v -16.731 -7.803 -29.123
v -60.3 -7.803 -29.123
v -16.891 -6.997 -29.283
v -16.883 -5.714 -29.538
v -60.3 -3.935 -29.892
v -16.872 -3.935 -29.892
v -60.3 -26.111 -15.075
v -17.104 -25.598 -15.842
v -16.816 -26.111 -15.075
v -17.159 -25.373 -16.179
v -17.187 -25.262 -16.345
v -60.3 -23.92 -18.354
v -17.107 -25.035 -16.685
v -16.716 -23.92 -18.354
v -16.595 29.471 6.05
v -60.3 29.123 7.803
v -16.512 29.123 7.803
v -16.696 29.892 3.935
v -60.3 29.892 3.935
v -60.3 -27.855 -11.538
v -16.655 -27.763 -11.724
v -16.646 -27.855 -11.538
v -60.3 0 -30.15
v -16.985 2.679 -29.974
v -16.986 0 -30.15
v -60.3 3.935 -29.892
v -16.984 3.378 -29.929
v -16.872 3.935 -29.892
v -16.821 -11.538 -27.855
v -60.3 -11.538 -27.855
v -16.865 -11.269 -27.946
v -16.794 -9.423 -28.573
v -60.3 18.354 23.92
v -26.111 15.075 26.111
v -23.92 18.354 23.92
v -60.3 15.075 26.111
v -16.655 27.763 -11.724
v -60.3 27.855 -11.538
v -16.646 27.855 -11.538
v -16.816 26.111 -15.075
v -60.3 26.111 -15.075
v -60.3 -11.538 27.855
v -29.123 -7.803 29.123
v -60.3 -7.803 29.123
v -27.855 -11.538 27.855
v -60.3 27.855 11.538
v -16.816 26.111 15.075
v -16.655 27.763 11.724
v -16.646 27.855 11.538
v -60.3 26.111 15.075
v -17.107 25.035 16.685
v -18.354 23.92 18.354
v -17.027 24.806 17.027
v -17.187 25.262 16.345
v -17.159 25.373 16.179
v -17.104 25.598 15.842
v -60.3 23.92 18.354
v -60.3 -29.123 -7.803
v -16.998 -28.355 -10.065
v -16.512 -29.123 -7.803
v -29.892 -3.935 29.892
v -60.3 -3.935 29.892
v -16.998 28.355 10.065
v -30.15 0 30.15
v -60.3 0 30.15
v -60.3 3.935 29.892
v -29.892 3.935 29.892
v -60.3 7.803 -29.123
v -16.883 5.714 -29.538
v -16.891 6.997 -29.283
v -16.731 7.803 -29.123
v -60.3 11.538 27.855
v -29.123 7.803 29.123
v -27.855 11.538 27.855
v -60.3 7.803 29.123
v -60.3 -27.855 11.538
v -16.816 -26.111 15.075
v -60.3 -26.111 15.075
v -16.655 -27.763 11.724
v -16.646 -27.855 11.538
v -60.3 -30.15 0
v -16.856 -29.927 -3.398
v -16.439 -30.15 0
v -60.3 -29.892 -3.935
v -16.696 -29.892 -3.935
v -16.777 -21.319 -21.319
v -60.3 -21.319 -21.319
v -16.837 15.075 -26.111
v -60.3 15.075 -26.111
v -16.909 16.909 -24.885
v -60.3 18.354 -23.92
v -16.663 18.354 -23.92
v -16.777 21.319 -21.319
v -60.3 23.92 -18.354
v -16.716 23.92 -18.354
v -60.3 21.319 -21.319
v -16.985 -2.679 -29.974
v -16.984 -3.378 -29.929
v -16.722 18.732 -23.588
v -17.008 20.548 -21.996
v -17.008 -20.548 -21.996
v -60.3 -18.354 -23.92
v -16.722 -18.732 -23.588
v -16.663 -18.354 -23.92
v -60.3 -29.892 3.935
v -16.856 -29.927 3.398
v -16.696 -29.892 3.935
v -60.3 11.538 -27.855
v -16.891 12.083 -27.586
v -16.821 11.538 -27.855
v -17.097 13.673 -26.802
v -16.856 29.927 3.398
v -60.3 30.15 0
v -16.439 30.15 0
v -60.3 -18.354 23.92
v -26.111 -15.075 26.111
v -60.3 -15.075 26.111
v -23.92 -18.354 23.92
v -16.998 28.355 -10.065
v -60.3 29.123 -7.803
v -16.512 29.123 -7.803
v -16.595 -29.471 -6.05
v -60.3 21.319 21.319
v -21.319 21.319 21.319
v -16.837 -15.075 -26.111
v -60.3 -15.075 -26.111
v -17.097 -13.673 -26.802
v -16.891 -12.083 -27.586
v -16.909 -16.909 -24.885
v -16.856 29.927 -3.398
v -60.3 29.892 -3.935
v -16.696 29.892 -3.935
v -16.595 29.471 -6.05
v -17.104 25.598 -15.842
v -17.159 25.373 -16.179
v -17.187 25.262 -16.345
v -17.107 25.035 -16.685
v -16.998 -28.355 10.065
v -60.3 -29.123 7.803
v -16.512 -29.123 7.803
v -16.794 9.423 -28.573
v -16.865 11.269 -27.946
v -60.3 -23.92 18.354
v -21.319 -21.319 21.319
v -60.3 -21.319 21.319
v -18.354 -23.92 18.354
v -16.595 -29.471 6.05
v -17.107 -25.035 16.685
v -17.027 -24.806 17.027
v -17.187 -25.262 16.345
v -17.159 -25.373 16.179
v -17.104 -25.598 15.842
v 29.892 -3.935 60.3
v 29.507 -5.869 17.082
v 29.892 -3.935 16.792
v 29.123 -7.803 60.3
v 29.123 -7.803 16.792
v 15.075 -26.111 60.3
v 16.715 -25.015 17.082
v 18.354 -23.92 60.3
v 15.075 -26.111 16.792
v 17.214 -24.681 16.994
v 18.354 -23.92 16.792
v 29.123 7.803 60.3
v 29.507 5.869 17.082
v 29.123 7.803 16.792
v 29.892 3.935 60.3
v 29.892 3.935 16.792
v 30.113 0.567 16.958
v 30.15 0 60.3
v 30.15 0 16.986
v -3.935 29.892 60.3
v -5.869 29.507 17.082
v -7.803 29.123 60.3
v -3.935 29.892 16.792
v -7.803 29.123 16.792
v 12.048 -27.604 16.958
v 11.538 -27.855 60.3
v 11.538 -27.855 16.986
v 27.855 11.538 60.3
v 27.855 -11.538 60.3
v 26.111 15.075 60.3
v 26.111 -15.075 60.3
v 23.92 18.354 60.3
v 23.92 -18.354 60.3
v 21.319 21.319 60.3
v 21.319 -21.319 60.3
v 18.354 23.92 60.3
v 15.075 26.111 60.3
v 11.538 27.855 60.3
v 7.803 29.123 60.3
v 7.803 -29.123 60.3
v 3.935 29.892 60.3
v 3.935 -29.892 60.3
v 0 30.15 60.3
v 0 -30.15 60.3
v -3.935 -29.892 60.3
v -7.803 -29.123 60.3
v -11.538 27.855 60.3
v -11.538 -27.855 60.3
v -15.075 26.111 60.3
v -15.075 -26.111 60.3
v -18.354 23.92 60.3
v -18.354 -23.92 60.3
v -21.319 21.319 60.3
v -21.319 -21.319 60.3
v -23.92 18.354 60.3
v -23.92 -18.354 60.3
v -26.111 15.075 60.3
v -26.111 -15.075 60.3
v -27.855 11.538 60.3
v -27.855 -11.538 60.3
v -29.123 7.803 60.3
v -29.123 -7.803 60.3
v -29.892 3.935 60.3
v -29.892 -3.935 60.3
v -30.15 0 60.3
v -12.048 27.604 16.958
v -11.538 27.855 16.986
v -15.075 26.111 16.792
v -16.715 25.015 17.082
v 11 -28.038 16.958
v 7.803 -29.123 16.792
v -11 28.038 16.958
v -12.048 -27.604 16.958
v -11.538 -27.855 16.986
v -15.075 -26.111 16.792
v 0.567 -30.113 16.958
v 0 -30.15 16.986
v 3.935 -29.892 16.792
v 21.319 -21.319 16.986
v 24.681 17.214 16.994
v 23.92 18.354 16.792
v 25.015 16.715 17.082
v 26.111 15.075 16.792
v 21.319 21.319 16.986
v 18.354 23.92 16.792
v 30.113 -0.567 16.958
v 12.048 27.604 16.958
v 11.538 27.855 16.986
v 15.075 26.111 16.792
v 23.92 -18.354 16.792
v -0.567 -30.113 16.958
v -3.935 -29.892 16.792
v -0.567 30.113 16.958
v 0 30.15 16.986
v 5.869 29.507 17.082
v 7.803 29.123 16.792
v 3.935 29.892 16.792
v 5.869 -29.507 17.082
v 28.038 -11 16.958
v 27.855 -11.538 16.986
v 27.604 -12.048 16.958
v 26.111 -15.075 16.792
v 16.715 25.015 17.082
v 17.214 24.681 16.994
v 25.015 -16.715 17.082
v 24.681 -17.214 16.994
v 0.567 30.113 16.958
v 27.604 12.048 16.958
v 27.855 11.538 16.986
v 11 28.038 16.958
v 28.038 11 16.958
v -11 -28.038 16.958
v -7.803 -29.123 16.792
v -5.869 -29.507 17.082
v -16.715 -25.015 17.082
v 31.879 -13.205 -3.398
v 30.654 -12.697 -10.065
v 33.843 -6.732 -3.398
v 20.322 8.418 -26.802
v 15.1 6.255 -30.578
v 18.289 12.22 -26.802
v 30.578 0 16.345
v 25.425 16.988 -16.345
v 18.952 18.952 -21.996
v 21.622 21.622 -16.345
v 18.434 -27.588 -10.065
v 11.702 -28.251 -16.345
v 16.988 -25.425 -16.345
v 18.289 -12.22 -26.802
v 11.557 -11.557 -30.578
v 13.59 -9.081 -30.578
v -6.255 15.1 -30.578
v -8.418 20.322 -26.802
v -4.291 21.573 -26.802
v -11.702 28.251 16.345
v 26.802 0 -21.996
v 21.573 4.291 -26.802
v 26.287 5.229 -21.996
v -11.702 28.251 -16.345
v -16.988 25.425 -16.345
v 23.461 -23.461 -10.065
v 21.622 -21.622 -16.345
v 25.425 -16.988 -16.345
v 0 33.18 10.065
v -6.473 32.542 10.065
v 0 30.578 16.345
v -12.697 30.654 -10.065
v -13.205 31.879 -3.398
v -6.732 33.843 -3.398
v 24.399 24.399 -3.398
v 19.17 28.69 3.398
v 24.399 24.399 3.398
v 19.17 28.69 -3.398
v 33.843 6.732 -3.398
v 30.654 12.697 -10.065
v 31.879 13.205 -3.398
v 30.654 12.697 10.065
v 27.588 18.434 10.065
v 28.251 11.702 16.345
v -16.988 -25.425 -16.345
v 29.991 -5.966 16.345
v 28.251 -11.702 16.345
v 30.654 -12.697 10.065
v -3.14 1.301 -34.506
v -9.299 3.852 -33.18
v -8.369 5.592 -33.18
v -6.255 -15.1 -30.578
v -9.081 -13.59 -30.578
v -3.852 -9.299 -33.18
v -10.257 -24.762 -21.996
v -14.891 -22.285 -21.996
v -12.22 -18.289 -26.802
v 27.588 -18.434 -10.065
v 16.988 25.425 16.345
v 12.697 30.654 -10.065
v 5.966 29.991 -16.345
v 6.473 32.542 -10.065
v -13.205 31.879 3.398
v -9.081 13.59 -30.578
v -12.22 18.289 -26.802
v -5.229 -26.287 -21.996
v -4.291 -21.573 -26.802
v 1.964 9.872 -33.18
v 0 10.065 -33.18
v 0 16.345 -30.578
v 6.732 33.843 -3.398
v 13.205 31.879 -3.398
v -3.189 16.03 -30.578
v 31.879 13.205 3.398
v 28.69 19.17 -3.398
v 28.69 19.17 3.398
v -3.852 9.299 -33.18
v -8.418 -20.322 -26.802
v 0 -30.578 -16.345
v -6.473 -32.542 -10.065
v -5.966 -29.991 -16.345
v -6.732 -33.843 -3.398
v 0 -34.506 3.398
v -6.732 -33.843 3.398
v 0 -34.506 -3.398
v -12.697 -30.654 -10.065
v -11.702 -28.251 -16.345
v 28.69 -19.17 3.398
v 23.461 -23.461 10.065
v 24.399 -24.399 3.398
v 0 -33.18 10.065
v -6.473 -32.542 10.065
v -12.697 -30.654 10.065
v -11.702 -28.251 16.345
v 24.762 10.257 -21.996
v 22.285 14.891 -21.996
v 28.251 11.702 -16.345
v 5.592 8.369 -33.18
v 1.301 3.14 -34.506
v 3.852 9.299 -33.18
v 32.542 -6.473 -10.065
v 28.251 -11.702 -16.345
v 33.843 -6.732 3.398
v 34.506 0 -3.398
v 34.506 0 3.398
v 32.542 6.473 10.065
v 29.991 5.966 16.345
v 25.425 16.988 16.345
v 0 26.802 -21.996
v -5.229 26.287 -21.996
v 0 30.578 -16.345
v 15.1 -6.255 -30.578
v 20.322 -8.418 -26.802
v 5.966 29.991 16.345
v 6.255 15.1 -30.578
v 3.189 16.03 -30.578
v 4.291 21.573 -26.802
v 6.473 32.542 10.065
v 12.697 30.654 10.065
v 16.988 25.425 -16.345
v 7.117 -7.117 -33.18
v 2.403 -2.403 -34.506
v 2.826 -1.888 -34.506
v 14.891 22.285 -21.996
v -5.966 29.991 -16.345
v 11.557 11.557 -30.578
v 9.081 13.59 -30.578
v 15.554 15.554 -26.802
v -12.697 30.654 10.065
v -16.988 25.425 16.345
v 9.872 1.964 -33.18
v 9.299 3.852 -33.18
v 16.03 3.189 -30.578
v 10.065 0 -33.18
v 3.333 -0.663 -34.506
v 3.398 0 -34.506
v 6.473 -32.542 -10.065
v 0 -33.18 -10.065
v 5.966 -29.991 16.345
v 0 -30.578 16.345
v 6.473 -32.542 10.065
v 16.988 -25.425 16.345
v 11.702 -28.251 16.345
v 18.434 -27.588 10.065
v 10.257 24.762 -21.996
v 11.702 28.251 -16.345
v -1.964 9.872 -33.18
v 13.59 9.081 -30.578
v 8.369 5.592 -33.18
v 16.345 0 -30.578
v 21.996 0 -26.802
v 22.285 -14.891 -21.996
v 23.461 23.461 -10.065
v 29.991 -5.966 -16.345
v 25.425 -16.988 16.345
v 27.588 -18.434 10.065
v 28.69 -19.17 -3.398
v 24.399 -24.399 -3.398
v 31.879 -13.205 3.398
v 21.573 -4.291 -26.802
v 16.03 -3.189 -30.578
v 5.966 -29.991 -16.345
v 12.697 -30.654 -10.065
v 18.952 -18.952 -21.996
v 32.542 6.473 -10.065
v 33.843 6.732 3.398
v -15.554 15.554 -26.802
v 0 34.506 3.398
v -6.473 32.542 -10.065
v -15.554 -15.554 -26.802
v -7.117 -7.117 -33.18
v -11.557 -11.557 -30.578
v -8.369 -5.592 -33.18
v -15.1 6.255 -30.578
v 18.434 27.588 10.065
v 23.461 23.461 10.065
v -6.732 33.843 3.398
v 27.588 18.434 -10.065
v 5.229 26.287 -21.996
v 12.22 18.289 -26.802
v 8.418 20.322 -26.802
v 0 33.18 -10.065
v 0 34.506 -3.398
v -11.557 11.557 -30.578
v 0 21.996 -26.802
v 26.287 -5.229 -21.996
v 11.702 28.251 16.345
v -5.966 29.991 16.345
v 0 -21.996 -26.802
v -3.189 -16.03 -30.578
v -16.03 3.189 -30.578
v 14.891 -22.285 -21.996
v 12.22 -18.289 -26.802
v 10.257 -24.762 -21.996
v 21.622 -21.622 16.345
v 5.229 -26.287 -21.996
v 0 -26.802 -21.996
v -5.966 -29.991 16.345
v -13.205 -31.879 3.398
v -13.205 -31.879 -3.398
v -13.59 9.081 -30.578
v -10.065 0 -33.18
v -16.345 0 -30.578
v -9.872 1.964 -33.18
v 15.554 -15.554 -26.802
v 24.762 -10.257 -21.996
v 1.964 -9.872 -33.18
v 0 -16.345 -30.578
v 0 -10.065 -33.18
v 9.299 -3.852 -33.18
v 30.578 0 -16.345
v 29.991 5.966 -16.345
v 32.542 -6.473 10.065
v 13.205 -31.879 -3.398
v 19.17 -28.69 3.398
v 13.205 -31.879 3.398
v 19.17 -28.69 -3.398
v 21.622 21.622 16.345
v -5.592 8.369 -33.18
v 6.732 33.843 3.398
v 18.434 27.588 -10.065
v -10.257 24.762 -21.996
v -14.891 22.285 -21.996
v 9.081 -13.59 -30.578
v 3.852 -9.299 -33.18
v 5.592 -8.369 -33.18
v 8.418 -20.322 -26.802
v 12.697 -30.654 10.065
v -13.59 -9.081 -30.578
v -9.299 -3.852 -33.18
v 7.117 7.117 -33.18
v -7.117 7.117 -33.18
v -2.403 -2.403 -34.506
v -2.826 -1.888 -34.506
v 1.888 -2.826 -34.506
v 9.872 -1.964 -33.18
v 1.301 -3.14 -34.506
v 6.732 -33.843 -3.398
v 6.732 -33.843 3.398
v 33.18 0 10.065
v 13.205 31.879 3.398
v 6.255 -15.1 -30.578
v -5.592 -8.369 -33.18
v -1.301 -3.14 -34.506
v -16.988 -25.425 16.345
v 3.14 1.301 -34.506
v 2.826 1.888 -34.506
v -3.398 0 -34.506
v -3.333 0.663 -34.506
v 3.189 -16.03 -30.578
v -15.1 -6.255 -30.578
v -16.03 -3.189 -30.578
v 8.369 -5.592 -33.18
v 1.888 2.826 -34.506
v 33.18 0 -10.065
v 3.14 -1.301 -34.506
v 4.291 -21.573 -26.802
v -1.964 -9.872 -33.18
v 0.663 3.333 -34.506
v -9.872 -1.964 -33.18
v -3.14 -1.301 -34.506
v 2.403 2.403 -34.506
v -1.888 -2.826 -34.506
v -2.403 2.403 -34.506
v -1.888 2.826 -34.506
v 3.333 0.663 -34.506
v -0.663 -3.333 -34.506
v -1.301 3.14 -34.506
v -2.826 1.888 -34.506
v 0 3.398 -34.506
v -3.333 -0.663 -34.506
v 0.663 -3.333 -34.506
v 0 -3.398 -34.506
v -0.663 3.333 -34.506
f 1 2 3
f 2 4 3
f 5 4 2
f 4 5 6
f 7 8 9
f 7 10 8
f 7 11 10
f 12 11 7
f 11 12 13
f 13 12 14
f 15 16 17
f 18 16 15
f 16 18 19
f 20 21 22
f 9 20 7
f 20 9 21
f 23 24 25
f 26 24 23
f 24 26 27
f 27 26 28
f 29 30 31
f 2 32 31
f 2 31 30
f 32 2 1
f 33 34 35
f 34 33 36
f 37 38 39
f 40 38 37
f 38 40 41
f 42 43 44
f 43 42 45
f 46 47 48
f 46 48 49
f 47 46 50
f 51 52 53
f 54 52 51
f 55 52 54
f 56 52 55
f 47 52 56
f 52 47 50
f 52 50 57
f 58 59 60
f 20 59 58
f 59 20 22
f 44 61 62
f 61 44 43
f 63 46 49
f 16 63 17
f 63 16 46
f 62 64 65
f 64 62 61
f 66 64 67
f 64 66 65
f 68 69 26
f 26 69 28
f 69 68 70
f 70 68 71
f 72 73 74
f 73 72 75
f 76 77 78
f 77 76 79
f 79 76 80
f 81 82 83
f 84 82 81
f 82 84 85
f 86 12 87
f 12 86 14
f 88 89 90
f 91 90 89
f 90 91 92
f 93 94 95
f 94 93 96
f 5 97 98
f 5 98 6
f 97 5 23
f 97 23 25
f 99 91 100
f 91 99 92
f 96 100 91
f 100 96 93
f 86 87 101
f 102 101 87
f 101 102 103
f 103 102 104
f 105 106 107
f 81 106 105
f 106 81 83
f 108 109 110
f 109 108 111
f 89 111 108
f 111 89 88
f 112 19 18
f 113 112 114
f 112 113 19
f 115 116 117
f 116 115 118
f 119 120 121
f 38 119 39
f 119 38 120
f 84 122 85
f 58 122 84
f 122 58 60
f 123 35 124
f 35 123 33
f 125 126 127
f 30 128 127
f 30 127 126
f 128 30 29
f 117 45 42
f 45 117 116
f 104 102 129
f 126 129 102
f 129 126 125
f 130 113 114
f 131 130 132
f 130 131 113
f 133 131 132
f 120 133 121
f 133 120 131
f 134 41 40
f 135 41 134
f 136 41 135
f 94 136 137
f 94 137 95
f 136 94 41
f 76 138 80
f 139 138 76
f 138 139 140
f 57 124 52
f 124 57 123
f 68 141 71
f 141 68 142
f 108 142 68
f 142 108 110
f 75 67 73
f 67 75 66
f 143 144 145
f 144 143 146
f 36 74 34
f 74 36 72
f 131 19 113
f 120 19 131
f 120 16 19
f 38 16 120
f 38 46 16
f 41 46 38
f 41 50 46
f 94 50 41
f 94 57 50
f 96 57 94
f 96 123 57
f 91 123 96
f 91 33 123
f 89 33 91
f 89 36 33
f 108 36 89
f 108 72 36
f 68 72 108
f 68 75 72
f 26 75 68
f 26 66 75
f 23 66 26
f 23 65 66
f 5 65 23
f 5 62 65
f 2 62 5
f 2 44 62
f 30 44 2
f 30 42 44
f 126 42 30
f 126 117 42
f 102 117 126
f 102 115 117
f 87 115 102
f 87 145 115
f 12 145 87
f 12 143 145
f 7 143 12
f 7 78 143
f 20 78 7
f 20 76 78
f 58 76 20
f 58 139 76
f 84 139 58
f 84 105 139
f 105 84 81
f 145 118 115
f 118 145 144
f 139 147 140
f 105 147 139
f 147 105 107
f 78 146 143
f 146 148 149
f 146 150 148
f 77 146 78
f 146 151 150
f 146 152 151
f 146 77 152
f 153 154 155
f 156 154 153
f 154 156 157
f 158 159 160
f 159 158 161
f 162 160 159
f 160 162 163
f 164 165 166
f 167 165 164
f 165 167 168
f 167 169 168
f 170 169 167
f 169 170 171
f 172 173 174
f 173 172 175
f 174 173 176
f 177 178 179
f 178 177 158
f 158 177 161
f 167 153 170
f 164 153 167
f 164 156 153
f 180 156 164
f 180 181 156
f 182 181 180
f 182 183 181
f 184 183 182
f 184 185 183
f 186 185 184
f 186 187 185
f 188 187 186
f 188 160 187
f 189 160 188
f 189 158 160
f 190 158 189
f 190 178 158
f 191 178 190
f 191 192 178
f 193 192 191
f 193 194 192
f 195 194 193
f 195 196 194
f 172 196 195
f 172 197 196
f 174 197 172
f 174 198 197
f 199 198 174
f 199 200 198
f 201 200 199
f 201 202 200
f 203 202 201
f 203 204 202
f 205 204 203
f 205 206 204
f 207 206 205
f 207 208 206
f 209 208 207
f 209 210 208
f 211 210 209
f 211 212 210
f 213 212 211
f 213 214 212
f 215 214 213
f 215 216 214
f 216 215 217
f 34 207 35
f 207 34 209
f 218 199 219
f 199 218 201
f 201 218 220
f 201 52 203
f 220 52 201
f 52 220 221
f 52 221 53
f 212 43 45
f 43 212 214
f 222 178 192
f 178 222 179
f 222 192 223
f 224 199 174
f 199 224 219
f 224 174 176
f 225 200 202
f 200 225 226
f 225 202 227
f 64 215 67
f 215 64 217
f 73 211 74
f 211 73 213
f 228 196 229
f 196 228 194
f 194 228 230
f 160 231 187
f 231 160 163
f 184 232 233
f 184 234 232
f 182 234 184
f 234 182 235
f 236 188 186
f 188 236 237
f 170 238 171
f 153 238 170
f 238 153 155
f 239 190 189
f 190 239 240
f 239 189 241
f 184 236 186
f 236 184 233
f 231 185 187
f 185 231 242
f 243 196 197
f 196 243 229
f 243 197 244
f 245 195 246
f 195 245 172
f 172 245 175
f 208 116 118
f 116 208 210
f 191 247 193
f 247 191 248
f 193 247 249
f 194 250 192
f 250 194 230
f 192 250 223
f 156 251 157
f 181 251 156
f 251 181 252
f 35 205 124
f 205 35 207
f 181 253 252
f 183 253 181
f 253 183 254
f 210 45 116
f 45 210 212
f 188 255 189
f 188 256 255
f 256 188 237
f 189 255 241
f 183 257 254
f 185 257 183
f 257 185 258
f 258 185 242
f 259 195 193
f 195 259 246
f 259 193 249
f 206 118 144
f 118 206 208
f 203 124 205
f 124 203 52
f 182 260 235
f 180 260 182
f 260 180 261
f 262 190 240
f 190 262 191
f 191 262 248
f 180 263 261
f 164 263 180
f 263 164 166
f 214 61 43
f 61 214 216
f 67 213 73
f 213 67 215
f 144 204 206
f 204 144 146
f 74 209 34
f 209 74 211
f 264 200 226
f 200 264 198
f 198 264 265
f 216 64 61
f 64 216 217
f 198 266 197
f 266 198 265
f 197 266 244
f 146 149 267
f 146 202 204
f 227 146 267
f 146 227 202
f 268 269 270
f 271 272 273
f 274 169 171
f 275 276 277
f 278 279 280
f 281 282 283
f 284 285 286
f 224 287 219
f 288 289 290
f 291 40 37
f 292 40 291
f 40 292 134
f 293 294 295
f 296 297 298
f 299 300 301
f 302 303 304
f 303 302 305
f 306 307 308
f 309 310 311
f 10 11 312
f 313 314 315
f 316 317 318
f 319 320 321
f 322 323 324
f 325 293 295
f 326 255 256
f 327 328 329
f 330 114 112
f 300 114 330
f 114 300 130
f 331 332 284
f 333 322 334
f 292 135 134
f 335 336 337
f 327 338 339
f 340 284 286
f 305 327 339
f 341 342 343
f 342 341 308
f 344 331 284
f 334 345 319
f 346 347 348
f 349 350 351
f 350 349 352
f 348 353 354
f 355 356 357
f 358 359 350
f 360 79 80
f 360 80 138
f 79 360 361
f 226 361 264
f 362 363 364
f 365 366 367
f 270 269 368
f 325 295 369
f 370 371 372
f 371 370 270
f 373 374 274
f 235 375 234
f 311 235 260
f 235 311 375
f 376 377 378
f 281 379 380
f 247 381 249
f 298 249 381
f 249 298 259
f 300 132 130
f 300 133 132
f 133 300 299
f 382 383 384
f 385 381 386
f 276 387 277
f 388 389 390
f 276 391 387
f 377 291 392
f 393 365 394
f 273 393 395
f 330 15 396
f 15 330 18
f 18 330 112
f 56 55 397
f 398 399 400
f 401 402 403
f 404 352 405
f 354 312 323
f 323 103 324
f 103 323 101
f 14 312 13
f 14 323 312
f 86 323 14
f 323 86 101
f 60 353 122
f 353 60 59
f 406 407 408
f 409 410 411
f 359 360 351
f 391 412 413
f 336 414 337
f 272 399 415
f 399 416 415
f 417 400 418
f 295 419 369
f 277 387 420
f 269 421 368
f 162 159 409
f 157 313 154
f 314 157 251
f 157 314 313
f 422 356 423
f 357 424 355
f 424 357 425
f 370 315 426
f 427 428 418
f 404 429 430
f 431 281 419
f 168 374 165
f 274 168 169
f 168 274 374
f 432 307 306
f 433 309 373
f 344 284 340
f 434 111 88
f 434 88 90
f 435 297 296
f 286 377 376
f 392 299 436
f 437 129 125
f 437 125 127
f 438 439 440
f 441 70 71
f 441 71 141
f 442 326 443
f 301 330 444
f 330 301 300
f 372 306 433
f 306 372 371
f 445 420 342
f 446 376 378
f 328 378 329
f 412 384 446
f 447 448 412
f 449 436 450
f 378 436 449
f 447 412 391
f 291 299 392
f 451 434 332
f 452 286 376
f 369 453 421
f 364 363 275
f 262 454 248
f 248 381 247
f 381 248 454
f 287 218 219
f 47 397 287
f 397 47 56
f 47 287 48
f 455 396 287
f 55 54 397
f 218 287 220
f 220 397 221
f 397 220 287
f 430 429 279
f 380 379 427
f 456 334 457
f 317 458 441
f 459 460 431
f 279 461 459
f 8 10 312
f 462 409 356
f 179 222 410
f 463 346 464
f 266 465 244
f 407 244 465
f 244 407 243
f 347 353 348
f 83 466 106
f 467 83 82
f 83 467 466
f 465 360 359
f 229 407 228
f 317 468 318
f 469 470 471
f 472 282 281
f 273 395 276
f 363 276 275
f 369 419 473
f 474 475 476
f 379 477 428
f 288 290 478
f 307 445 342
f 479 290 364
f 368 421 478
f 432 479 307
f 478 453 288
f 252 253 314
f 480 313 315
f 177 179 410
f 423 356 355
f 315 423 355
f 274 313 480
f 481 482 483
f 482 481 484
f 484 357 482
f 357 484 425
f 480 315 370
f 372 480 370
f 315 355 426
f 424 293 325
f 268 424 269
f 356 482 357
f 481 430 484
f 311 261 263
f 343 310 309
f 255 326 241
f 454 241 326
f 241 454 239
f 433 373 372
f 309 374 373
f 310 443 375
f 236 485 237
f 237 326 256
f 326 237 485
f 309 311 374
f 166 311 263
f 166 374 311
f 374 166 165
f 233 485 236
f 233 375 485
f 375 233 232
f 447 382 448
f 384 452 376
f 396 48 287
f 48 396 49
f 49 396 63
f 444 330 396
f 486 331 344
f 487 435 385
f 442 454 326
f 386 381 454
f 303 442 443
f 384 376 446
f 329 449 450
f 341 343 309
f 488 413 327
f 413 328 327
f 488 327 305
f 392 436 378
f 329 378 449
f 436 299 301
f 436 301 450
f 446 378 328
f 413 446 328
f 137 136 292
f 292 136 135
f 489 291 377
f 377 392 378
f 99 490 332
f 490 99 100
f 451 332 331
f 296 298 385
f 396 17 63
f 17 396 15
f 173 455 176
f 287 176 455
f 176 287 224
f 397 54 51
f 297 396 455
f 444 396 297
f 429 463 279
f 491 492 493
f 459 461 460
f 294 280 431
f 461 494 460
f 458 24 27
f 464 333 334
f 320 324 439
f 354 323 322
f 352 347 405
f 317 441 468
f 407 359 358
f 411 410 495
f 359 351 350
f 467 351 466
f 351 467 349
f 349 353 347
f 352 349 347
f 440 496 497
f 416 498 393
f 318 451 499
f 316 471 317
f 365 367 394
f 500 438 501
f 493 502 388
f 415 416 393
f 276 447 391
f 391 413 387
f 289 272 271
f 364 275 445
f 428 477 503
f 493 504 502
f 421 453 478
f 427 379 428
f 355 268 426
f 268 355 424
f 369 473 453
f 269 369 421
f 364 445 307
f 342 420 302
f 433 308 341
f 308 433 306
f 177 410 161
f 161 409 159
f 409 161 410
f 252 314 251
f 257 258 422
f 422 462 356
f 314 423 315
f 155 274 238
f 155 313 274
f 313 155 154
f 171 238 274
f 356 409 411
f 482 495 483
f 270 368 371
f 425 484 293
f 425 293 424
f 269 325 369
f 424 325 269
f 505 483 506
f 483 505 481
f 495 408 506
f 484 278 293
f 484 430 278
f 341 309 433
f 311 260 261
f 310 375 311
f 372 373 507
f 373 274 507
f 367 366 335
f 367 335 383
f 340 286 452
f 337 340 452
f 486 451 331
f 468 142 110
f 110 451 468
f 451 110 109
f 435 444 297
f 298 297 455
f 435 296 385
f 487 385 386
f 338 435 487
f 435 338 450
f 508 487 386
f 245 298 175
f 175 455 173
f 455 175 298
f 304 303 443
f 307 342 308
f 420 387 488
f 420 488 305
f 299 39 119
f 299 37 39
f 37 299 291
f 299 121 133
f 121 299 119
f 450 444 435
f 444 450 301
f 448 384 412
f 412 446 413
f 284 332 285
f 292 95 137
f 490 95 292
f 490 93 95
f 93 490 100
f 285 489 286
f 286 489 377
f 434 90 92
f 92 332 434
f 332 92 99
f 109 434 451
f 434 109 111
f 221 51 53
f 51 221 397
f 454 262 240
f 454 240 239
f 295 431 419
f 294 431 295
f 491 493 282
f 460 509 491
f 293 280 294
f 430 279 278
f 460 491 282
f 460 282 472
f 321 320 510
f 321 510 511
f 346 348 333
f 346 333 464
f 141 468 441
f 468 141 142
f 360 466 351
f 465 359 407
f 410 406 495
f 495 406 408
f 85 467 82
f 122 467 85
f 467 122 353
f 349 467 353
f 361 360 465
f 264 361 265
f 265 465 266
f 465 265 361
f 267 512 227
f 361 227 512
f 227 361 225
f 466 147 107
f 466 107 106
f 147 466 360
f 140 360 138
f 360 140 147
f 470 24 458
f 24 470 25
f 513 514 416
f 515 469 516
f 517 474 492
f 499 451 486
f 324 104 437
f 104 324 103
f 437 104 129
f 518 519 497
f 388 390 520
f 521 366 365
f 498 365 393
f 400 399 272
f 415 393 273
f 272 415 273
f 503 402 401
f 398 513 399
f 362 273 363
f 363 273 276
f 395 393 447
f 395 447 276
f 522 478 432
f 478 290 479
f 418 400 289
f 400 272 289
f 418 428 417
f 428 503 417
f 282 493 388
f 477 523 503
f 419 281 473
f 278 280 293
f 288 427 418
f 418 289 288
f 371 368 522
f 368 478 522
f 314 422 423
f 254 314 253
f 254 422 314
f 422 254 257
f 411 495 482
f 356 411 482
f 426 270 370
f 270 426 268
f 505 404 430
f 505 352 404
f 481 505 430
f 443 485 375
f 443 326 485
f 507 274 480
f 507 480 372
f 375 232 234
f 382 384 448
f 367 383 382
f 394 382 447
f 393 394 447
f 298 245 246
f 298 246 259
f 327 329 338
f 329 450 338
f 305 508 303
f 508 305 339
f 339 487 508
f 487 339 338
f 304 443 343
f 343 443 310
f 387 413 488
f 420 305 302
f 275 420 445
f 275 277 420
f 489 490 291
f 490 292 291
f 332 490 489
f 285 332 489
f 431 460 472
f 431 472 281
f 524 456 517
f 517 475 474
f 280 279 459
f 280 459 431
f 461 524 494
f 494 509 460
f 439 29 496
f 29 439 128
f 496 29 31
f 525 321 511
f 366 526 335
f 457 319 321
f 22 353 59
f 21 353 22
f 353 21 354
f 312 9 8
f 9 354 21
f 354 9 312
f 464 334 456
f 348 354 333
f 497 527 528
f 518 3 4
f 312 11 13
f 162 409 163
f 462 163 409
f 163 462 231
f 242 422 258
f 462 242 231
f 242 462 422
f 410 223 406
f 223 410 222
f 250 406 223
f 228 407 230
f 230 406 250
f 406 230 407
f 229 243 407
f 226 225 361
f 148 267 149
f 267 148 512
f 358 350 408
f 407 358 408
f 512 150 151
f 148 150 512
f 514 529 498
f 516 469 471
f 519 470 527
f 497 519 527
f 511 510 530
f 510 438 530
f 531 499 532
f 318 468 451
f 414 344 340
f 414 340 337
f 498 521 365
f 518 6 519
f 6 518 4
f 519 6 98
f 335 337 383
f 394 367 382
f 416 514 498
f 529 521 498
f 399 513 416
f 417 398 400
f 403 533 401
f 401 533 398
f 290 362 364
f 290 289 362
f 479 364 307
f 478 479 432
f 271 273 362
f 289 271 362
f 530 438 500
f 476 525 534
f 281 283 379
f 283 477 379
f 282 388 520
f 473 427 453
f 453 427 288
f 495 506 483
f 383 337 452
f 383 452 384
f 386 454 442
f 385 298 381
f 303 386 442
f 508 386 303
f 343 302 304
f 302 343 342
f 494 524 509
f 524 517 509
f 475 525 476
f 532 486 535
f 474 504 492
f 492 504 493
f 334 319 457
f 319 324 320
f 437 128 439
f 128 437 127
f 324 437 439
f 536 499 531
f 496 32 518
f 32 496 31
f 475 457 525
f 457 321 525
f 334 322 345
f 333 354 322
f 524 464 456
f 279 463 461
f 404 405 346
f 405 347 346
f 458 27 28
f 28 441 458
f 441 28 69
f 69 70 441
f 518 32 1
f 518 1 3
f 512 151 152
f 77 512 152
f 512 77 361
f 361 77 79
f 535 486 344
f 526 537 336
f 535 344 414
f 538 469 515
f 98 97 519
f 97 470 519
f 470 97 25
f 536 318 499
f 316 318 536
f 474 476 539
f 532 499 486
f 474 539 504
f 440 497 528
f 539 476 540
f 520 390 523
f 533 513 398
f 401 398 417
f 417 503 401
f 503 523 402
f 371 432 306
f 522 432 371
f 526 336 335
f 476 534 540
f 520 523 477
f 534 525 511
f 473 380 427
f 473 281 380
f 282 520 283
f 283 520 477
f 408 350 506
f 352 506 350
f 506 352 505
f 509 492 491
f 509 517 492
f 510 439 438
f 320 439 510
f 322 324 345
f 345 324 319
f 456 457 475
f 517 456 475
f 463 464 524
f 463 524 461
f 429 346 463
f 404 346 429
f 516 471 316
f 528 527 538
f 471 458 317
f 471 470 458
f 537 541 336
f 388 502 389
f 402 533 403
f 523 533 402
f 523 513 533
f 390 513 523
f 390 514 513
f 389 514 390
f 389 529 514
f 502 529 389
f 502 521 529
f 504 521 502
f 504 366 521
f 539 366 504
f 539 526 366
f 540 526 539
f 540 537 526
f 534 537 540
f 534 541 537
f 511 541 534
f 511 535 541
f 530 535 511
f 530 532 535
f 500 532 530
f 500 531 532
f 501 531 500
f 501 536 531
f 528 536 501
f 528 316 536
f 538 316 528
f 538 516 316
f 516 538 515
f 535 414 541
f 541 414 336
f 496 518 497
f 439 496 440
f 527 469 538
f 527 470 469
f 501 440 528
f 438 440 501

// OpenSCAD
// Auto-generated by scripts/author_from_manifest.py (Phase D.3).
// Source: data/phase_d_manifest.json (sku_intent='victaulic-no11-elbow-45-grooved-2in').
// Do not hand-edit — regenerate from the manifest.
//
// @part victaulic_no11_elbow_45_grooved_2in
// @kind fitting
// @category fitting.elbow
// @display-name "Victaulic No. 11 45° Grooved Elbow 2\""
// @mfg victaulic
// @mfg-pn No._11_2in
// @listing UL FM
// @price-usd 40.00
// @install-minutes 6
// @crew journeyman
// @param size_in number default=2 label="Size" unit="in"
// @port in position=[-0.05,0,0] direction=[-1,0,0] style=grooved size_in=2 role=run_a
// @port out position=[0,0,0.05] direction=[0,0,1] style=grooved size_in=2 role=run_b

size_in = 2.0;

function od_mm(nps) =
    nps ==   1  ? 33.4 :
    nps == 1.25 ? 42.2 :
    nps == 1.5  ? 48.3 :
    nps ==   2  ? 60.3 :
    nps == 2.5  ? 73.0 :
    nps ==   3  ? 88.9 :
    nps ==   4  ? 114.3 :
    nps ==   5  ? 141.3 :
    nps ==   6  ? 168.3 :
    nps ==   8  ? 219.1 :
    nps ==  10  ? 273.0 : 60.3;

od = od_mm(size_in);
leg = od * 1.0;

union() {
    // Inlet leg along -X
    translate([-leg/2, 0, 0])
        rotate([0, 90, 0])
        cylinder(h = leg, d = od, center = true, $fn = 48);
    // Outlet leg along +Z
    translate([0, 0, leg/2])
        cylinder(h = leg, d = od, center = true, $fn = 48);
    // Knuckle
    sphere(d = od * 1.15, $fn = 32);
}
